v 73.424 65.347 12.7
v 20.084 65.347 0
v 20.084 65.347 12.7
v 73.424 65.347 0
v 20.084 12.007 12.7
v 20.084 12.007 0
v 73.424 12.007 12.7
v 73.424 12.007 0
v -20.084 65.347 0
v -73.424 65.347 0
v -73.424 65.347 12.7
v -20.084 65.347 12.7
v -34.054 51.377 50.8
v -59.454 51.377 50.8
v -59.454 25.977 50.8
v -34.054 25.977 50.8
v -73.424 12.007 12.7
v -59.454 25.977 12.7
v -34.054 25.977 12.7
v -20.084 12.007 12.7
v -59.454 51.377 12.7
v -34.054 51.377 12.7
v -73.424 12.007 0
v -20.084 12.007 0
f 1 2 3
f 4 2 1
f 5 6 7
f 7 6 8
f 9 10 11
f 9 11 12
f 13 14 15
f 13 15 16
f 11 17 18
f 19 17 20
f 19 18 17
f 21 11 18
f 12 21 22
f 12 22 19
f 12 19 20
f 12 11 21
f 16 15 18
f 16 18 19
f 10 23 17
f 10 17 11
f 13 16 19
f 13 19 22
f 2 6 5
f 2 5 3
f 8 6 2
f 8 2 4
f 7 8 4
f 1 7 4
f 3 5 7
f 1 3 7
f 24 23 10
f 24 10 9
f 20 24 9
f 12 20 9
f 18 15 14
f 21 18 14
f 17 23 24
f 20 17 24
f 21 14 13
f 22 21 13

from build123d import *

# Parameters (mm, degrees)
F0_W     = 53.34
F0_H     = 53.34
F0_W_2   = 25.4
F0_H_2   = 25.4
F1_DEPTH = 12.7
F2_DEPTH = 50.8


with BuildPart() as f1:
    # F0 (on Top) → F1 (new body)
    with BuildSketch(Plane.XY):
        with Locations((-46.754366, 38.676957)):
            Rectangle(F0_W, F0_H)
        with Locations((-46.754366, 38.676957)):
            Rectangle(F0_W_2, F0_H_2, mode=Mode.SUBTRACT)
        with Locations((46.754366, 38.676957)):
            Rectangle(F0_W, F0_H)
    extrude(amount=F1_DEPTH)

    # F0 (on Top) → F2 (join)
    with BuildSketch(Plane.XY):
        with Locations((-46.754366, 38.676957)):
            Rectangle(F0_W_2, F0_H_2)
    extrude(amount=F2_DEPTH)


solid = f1.part
